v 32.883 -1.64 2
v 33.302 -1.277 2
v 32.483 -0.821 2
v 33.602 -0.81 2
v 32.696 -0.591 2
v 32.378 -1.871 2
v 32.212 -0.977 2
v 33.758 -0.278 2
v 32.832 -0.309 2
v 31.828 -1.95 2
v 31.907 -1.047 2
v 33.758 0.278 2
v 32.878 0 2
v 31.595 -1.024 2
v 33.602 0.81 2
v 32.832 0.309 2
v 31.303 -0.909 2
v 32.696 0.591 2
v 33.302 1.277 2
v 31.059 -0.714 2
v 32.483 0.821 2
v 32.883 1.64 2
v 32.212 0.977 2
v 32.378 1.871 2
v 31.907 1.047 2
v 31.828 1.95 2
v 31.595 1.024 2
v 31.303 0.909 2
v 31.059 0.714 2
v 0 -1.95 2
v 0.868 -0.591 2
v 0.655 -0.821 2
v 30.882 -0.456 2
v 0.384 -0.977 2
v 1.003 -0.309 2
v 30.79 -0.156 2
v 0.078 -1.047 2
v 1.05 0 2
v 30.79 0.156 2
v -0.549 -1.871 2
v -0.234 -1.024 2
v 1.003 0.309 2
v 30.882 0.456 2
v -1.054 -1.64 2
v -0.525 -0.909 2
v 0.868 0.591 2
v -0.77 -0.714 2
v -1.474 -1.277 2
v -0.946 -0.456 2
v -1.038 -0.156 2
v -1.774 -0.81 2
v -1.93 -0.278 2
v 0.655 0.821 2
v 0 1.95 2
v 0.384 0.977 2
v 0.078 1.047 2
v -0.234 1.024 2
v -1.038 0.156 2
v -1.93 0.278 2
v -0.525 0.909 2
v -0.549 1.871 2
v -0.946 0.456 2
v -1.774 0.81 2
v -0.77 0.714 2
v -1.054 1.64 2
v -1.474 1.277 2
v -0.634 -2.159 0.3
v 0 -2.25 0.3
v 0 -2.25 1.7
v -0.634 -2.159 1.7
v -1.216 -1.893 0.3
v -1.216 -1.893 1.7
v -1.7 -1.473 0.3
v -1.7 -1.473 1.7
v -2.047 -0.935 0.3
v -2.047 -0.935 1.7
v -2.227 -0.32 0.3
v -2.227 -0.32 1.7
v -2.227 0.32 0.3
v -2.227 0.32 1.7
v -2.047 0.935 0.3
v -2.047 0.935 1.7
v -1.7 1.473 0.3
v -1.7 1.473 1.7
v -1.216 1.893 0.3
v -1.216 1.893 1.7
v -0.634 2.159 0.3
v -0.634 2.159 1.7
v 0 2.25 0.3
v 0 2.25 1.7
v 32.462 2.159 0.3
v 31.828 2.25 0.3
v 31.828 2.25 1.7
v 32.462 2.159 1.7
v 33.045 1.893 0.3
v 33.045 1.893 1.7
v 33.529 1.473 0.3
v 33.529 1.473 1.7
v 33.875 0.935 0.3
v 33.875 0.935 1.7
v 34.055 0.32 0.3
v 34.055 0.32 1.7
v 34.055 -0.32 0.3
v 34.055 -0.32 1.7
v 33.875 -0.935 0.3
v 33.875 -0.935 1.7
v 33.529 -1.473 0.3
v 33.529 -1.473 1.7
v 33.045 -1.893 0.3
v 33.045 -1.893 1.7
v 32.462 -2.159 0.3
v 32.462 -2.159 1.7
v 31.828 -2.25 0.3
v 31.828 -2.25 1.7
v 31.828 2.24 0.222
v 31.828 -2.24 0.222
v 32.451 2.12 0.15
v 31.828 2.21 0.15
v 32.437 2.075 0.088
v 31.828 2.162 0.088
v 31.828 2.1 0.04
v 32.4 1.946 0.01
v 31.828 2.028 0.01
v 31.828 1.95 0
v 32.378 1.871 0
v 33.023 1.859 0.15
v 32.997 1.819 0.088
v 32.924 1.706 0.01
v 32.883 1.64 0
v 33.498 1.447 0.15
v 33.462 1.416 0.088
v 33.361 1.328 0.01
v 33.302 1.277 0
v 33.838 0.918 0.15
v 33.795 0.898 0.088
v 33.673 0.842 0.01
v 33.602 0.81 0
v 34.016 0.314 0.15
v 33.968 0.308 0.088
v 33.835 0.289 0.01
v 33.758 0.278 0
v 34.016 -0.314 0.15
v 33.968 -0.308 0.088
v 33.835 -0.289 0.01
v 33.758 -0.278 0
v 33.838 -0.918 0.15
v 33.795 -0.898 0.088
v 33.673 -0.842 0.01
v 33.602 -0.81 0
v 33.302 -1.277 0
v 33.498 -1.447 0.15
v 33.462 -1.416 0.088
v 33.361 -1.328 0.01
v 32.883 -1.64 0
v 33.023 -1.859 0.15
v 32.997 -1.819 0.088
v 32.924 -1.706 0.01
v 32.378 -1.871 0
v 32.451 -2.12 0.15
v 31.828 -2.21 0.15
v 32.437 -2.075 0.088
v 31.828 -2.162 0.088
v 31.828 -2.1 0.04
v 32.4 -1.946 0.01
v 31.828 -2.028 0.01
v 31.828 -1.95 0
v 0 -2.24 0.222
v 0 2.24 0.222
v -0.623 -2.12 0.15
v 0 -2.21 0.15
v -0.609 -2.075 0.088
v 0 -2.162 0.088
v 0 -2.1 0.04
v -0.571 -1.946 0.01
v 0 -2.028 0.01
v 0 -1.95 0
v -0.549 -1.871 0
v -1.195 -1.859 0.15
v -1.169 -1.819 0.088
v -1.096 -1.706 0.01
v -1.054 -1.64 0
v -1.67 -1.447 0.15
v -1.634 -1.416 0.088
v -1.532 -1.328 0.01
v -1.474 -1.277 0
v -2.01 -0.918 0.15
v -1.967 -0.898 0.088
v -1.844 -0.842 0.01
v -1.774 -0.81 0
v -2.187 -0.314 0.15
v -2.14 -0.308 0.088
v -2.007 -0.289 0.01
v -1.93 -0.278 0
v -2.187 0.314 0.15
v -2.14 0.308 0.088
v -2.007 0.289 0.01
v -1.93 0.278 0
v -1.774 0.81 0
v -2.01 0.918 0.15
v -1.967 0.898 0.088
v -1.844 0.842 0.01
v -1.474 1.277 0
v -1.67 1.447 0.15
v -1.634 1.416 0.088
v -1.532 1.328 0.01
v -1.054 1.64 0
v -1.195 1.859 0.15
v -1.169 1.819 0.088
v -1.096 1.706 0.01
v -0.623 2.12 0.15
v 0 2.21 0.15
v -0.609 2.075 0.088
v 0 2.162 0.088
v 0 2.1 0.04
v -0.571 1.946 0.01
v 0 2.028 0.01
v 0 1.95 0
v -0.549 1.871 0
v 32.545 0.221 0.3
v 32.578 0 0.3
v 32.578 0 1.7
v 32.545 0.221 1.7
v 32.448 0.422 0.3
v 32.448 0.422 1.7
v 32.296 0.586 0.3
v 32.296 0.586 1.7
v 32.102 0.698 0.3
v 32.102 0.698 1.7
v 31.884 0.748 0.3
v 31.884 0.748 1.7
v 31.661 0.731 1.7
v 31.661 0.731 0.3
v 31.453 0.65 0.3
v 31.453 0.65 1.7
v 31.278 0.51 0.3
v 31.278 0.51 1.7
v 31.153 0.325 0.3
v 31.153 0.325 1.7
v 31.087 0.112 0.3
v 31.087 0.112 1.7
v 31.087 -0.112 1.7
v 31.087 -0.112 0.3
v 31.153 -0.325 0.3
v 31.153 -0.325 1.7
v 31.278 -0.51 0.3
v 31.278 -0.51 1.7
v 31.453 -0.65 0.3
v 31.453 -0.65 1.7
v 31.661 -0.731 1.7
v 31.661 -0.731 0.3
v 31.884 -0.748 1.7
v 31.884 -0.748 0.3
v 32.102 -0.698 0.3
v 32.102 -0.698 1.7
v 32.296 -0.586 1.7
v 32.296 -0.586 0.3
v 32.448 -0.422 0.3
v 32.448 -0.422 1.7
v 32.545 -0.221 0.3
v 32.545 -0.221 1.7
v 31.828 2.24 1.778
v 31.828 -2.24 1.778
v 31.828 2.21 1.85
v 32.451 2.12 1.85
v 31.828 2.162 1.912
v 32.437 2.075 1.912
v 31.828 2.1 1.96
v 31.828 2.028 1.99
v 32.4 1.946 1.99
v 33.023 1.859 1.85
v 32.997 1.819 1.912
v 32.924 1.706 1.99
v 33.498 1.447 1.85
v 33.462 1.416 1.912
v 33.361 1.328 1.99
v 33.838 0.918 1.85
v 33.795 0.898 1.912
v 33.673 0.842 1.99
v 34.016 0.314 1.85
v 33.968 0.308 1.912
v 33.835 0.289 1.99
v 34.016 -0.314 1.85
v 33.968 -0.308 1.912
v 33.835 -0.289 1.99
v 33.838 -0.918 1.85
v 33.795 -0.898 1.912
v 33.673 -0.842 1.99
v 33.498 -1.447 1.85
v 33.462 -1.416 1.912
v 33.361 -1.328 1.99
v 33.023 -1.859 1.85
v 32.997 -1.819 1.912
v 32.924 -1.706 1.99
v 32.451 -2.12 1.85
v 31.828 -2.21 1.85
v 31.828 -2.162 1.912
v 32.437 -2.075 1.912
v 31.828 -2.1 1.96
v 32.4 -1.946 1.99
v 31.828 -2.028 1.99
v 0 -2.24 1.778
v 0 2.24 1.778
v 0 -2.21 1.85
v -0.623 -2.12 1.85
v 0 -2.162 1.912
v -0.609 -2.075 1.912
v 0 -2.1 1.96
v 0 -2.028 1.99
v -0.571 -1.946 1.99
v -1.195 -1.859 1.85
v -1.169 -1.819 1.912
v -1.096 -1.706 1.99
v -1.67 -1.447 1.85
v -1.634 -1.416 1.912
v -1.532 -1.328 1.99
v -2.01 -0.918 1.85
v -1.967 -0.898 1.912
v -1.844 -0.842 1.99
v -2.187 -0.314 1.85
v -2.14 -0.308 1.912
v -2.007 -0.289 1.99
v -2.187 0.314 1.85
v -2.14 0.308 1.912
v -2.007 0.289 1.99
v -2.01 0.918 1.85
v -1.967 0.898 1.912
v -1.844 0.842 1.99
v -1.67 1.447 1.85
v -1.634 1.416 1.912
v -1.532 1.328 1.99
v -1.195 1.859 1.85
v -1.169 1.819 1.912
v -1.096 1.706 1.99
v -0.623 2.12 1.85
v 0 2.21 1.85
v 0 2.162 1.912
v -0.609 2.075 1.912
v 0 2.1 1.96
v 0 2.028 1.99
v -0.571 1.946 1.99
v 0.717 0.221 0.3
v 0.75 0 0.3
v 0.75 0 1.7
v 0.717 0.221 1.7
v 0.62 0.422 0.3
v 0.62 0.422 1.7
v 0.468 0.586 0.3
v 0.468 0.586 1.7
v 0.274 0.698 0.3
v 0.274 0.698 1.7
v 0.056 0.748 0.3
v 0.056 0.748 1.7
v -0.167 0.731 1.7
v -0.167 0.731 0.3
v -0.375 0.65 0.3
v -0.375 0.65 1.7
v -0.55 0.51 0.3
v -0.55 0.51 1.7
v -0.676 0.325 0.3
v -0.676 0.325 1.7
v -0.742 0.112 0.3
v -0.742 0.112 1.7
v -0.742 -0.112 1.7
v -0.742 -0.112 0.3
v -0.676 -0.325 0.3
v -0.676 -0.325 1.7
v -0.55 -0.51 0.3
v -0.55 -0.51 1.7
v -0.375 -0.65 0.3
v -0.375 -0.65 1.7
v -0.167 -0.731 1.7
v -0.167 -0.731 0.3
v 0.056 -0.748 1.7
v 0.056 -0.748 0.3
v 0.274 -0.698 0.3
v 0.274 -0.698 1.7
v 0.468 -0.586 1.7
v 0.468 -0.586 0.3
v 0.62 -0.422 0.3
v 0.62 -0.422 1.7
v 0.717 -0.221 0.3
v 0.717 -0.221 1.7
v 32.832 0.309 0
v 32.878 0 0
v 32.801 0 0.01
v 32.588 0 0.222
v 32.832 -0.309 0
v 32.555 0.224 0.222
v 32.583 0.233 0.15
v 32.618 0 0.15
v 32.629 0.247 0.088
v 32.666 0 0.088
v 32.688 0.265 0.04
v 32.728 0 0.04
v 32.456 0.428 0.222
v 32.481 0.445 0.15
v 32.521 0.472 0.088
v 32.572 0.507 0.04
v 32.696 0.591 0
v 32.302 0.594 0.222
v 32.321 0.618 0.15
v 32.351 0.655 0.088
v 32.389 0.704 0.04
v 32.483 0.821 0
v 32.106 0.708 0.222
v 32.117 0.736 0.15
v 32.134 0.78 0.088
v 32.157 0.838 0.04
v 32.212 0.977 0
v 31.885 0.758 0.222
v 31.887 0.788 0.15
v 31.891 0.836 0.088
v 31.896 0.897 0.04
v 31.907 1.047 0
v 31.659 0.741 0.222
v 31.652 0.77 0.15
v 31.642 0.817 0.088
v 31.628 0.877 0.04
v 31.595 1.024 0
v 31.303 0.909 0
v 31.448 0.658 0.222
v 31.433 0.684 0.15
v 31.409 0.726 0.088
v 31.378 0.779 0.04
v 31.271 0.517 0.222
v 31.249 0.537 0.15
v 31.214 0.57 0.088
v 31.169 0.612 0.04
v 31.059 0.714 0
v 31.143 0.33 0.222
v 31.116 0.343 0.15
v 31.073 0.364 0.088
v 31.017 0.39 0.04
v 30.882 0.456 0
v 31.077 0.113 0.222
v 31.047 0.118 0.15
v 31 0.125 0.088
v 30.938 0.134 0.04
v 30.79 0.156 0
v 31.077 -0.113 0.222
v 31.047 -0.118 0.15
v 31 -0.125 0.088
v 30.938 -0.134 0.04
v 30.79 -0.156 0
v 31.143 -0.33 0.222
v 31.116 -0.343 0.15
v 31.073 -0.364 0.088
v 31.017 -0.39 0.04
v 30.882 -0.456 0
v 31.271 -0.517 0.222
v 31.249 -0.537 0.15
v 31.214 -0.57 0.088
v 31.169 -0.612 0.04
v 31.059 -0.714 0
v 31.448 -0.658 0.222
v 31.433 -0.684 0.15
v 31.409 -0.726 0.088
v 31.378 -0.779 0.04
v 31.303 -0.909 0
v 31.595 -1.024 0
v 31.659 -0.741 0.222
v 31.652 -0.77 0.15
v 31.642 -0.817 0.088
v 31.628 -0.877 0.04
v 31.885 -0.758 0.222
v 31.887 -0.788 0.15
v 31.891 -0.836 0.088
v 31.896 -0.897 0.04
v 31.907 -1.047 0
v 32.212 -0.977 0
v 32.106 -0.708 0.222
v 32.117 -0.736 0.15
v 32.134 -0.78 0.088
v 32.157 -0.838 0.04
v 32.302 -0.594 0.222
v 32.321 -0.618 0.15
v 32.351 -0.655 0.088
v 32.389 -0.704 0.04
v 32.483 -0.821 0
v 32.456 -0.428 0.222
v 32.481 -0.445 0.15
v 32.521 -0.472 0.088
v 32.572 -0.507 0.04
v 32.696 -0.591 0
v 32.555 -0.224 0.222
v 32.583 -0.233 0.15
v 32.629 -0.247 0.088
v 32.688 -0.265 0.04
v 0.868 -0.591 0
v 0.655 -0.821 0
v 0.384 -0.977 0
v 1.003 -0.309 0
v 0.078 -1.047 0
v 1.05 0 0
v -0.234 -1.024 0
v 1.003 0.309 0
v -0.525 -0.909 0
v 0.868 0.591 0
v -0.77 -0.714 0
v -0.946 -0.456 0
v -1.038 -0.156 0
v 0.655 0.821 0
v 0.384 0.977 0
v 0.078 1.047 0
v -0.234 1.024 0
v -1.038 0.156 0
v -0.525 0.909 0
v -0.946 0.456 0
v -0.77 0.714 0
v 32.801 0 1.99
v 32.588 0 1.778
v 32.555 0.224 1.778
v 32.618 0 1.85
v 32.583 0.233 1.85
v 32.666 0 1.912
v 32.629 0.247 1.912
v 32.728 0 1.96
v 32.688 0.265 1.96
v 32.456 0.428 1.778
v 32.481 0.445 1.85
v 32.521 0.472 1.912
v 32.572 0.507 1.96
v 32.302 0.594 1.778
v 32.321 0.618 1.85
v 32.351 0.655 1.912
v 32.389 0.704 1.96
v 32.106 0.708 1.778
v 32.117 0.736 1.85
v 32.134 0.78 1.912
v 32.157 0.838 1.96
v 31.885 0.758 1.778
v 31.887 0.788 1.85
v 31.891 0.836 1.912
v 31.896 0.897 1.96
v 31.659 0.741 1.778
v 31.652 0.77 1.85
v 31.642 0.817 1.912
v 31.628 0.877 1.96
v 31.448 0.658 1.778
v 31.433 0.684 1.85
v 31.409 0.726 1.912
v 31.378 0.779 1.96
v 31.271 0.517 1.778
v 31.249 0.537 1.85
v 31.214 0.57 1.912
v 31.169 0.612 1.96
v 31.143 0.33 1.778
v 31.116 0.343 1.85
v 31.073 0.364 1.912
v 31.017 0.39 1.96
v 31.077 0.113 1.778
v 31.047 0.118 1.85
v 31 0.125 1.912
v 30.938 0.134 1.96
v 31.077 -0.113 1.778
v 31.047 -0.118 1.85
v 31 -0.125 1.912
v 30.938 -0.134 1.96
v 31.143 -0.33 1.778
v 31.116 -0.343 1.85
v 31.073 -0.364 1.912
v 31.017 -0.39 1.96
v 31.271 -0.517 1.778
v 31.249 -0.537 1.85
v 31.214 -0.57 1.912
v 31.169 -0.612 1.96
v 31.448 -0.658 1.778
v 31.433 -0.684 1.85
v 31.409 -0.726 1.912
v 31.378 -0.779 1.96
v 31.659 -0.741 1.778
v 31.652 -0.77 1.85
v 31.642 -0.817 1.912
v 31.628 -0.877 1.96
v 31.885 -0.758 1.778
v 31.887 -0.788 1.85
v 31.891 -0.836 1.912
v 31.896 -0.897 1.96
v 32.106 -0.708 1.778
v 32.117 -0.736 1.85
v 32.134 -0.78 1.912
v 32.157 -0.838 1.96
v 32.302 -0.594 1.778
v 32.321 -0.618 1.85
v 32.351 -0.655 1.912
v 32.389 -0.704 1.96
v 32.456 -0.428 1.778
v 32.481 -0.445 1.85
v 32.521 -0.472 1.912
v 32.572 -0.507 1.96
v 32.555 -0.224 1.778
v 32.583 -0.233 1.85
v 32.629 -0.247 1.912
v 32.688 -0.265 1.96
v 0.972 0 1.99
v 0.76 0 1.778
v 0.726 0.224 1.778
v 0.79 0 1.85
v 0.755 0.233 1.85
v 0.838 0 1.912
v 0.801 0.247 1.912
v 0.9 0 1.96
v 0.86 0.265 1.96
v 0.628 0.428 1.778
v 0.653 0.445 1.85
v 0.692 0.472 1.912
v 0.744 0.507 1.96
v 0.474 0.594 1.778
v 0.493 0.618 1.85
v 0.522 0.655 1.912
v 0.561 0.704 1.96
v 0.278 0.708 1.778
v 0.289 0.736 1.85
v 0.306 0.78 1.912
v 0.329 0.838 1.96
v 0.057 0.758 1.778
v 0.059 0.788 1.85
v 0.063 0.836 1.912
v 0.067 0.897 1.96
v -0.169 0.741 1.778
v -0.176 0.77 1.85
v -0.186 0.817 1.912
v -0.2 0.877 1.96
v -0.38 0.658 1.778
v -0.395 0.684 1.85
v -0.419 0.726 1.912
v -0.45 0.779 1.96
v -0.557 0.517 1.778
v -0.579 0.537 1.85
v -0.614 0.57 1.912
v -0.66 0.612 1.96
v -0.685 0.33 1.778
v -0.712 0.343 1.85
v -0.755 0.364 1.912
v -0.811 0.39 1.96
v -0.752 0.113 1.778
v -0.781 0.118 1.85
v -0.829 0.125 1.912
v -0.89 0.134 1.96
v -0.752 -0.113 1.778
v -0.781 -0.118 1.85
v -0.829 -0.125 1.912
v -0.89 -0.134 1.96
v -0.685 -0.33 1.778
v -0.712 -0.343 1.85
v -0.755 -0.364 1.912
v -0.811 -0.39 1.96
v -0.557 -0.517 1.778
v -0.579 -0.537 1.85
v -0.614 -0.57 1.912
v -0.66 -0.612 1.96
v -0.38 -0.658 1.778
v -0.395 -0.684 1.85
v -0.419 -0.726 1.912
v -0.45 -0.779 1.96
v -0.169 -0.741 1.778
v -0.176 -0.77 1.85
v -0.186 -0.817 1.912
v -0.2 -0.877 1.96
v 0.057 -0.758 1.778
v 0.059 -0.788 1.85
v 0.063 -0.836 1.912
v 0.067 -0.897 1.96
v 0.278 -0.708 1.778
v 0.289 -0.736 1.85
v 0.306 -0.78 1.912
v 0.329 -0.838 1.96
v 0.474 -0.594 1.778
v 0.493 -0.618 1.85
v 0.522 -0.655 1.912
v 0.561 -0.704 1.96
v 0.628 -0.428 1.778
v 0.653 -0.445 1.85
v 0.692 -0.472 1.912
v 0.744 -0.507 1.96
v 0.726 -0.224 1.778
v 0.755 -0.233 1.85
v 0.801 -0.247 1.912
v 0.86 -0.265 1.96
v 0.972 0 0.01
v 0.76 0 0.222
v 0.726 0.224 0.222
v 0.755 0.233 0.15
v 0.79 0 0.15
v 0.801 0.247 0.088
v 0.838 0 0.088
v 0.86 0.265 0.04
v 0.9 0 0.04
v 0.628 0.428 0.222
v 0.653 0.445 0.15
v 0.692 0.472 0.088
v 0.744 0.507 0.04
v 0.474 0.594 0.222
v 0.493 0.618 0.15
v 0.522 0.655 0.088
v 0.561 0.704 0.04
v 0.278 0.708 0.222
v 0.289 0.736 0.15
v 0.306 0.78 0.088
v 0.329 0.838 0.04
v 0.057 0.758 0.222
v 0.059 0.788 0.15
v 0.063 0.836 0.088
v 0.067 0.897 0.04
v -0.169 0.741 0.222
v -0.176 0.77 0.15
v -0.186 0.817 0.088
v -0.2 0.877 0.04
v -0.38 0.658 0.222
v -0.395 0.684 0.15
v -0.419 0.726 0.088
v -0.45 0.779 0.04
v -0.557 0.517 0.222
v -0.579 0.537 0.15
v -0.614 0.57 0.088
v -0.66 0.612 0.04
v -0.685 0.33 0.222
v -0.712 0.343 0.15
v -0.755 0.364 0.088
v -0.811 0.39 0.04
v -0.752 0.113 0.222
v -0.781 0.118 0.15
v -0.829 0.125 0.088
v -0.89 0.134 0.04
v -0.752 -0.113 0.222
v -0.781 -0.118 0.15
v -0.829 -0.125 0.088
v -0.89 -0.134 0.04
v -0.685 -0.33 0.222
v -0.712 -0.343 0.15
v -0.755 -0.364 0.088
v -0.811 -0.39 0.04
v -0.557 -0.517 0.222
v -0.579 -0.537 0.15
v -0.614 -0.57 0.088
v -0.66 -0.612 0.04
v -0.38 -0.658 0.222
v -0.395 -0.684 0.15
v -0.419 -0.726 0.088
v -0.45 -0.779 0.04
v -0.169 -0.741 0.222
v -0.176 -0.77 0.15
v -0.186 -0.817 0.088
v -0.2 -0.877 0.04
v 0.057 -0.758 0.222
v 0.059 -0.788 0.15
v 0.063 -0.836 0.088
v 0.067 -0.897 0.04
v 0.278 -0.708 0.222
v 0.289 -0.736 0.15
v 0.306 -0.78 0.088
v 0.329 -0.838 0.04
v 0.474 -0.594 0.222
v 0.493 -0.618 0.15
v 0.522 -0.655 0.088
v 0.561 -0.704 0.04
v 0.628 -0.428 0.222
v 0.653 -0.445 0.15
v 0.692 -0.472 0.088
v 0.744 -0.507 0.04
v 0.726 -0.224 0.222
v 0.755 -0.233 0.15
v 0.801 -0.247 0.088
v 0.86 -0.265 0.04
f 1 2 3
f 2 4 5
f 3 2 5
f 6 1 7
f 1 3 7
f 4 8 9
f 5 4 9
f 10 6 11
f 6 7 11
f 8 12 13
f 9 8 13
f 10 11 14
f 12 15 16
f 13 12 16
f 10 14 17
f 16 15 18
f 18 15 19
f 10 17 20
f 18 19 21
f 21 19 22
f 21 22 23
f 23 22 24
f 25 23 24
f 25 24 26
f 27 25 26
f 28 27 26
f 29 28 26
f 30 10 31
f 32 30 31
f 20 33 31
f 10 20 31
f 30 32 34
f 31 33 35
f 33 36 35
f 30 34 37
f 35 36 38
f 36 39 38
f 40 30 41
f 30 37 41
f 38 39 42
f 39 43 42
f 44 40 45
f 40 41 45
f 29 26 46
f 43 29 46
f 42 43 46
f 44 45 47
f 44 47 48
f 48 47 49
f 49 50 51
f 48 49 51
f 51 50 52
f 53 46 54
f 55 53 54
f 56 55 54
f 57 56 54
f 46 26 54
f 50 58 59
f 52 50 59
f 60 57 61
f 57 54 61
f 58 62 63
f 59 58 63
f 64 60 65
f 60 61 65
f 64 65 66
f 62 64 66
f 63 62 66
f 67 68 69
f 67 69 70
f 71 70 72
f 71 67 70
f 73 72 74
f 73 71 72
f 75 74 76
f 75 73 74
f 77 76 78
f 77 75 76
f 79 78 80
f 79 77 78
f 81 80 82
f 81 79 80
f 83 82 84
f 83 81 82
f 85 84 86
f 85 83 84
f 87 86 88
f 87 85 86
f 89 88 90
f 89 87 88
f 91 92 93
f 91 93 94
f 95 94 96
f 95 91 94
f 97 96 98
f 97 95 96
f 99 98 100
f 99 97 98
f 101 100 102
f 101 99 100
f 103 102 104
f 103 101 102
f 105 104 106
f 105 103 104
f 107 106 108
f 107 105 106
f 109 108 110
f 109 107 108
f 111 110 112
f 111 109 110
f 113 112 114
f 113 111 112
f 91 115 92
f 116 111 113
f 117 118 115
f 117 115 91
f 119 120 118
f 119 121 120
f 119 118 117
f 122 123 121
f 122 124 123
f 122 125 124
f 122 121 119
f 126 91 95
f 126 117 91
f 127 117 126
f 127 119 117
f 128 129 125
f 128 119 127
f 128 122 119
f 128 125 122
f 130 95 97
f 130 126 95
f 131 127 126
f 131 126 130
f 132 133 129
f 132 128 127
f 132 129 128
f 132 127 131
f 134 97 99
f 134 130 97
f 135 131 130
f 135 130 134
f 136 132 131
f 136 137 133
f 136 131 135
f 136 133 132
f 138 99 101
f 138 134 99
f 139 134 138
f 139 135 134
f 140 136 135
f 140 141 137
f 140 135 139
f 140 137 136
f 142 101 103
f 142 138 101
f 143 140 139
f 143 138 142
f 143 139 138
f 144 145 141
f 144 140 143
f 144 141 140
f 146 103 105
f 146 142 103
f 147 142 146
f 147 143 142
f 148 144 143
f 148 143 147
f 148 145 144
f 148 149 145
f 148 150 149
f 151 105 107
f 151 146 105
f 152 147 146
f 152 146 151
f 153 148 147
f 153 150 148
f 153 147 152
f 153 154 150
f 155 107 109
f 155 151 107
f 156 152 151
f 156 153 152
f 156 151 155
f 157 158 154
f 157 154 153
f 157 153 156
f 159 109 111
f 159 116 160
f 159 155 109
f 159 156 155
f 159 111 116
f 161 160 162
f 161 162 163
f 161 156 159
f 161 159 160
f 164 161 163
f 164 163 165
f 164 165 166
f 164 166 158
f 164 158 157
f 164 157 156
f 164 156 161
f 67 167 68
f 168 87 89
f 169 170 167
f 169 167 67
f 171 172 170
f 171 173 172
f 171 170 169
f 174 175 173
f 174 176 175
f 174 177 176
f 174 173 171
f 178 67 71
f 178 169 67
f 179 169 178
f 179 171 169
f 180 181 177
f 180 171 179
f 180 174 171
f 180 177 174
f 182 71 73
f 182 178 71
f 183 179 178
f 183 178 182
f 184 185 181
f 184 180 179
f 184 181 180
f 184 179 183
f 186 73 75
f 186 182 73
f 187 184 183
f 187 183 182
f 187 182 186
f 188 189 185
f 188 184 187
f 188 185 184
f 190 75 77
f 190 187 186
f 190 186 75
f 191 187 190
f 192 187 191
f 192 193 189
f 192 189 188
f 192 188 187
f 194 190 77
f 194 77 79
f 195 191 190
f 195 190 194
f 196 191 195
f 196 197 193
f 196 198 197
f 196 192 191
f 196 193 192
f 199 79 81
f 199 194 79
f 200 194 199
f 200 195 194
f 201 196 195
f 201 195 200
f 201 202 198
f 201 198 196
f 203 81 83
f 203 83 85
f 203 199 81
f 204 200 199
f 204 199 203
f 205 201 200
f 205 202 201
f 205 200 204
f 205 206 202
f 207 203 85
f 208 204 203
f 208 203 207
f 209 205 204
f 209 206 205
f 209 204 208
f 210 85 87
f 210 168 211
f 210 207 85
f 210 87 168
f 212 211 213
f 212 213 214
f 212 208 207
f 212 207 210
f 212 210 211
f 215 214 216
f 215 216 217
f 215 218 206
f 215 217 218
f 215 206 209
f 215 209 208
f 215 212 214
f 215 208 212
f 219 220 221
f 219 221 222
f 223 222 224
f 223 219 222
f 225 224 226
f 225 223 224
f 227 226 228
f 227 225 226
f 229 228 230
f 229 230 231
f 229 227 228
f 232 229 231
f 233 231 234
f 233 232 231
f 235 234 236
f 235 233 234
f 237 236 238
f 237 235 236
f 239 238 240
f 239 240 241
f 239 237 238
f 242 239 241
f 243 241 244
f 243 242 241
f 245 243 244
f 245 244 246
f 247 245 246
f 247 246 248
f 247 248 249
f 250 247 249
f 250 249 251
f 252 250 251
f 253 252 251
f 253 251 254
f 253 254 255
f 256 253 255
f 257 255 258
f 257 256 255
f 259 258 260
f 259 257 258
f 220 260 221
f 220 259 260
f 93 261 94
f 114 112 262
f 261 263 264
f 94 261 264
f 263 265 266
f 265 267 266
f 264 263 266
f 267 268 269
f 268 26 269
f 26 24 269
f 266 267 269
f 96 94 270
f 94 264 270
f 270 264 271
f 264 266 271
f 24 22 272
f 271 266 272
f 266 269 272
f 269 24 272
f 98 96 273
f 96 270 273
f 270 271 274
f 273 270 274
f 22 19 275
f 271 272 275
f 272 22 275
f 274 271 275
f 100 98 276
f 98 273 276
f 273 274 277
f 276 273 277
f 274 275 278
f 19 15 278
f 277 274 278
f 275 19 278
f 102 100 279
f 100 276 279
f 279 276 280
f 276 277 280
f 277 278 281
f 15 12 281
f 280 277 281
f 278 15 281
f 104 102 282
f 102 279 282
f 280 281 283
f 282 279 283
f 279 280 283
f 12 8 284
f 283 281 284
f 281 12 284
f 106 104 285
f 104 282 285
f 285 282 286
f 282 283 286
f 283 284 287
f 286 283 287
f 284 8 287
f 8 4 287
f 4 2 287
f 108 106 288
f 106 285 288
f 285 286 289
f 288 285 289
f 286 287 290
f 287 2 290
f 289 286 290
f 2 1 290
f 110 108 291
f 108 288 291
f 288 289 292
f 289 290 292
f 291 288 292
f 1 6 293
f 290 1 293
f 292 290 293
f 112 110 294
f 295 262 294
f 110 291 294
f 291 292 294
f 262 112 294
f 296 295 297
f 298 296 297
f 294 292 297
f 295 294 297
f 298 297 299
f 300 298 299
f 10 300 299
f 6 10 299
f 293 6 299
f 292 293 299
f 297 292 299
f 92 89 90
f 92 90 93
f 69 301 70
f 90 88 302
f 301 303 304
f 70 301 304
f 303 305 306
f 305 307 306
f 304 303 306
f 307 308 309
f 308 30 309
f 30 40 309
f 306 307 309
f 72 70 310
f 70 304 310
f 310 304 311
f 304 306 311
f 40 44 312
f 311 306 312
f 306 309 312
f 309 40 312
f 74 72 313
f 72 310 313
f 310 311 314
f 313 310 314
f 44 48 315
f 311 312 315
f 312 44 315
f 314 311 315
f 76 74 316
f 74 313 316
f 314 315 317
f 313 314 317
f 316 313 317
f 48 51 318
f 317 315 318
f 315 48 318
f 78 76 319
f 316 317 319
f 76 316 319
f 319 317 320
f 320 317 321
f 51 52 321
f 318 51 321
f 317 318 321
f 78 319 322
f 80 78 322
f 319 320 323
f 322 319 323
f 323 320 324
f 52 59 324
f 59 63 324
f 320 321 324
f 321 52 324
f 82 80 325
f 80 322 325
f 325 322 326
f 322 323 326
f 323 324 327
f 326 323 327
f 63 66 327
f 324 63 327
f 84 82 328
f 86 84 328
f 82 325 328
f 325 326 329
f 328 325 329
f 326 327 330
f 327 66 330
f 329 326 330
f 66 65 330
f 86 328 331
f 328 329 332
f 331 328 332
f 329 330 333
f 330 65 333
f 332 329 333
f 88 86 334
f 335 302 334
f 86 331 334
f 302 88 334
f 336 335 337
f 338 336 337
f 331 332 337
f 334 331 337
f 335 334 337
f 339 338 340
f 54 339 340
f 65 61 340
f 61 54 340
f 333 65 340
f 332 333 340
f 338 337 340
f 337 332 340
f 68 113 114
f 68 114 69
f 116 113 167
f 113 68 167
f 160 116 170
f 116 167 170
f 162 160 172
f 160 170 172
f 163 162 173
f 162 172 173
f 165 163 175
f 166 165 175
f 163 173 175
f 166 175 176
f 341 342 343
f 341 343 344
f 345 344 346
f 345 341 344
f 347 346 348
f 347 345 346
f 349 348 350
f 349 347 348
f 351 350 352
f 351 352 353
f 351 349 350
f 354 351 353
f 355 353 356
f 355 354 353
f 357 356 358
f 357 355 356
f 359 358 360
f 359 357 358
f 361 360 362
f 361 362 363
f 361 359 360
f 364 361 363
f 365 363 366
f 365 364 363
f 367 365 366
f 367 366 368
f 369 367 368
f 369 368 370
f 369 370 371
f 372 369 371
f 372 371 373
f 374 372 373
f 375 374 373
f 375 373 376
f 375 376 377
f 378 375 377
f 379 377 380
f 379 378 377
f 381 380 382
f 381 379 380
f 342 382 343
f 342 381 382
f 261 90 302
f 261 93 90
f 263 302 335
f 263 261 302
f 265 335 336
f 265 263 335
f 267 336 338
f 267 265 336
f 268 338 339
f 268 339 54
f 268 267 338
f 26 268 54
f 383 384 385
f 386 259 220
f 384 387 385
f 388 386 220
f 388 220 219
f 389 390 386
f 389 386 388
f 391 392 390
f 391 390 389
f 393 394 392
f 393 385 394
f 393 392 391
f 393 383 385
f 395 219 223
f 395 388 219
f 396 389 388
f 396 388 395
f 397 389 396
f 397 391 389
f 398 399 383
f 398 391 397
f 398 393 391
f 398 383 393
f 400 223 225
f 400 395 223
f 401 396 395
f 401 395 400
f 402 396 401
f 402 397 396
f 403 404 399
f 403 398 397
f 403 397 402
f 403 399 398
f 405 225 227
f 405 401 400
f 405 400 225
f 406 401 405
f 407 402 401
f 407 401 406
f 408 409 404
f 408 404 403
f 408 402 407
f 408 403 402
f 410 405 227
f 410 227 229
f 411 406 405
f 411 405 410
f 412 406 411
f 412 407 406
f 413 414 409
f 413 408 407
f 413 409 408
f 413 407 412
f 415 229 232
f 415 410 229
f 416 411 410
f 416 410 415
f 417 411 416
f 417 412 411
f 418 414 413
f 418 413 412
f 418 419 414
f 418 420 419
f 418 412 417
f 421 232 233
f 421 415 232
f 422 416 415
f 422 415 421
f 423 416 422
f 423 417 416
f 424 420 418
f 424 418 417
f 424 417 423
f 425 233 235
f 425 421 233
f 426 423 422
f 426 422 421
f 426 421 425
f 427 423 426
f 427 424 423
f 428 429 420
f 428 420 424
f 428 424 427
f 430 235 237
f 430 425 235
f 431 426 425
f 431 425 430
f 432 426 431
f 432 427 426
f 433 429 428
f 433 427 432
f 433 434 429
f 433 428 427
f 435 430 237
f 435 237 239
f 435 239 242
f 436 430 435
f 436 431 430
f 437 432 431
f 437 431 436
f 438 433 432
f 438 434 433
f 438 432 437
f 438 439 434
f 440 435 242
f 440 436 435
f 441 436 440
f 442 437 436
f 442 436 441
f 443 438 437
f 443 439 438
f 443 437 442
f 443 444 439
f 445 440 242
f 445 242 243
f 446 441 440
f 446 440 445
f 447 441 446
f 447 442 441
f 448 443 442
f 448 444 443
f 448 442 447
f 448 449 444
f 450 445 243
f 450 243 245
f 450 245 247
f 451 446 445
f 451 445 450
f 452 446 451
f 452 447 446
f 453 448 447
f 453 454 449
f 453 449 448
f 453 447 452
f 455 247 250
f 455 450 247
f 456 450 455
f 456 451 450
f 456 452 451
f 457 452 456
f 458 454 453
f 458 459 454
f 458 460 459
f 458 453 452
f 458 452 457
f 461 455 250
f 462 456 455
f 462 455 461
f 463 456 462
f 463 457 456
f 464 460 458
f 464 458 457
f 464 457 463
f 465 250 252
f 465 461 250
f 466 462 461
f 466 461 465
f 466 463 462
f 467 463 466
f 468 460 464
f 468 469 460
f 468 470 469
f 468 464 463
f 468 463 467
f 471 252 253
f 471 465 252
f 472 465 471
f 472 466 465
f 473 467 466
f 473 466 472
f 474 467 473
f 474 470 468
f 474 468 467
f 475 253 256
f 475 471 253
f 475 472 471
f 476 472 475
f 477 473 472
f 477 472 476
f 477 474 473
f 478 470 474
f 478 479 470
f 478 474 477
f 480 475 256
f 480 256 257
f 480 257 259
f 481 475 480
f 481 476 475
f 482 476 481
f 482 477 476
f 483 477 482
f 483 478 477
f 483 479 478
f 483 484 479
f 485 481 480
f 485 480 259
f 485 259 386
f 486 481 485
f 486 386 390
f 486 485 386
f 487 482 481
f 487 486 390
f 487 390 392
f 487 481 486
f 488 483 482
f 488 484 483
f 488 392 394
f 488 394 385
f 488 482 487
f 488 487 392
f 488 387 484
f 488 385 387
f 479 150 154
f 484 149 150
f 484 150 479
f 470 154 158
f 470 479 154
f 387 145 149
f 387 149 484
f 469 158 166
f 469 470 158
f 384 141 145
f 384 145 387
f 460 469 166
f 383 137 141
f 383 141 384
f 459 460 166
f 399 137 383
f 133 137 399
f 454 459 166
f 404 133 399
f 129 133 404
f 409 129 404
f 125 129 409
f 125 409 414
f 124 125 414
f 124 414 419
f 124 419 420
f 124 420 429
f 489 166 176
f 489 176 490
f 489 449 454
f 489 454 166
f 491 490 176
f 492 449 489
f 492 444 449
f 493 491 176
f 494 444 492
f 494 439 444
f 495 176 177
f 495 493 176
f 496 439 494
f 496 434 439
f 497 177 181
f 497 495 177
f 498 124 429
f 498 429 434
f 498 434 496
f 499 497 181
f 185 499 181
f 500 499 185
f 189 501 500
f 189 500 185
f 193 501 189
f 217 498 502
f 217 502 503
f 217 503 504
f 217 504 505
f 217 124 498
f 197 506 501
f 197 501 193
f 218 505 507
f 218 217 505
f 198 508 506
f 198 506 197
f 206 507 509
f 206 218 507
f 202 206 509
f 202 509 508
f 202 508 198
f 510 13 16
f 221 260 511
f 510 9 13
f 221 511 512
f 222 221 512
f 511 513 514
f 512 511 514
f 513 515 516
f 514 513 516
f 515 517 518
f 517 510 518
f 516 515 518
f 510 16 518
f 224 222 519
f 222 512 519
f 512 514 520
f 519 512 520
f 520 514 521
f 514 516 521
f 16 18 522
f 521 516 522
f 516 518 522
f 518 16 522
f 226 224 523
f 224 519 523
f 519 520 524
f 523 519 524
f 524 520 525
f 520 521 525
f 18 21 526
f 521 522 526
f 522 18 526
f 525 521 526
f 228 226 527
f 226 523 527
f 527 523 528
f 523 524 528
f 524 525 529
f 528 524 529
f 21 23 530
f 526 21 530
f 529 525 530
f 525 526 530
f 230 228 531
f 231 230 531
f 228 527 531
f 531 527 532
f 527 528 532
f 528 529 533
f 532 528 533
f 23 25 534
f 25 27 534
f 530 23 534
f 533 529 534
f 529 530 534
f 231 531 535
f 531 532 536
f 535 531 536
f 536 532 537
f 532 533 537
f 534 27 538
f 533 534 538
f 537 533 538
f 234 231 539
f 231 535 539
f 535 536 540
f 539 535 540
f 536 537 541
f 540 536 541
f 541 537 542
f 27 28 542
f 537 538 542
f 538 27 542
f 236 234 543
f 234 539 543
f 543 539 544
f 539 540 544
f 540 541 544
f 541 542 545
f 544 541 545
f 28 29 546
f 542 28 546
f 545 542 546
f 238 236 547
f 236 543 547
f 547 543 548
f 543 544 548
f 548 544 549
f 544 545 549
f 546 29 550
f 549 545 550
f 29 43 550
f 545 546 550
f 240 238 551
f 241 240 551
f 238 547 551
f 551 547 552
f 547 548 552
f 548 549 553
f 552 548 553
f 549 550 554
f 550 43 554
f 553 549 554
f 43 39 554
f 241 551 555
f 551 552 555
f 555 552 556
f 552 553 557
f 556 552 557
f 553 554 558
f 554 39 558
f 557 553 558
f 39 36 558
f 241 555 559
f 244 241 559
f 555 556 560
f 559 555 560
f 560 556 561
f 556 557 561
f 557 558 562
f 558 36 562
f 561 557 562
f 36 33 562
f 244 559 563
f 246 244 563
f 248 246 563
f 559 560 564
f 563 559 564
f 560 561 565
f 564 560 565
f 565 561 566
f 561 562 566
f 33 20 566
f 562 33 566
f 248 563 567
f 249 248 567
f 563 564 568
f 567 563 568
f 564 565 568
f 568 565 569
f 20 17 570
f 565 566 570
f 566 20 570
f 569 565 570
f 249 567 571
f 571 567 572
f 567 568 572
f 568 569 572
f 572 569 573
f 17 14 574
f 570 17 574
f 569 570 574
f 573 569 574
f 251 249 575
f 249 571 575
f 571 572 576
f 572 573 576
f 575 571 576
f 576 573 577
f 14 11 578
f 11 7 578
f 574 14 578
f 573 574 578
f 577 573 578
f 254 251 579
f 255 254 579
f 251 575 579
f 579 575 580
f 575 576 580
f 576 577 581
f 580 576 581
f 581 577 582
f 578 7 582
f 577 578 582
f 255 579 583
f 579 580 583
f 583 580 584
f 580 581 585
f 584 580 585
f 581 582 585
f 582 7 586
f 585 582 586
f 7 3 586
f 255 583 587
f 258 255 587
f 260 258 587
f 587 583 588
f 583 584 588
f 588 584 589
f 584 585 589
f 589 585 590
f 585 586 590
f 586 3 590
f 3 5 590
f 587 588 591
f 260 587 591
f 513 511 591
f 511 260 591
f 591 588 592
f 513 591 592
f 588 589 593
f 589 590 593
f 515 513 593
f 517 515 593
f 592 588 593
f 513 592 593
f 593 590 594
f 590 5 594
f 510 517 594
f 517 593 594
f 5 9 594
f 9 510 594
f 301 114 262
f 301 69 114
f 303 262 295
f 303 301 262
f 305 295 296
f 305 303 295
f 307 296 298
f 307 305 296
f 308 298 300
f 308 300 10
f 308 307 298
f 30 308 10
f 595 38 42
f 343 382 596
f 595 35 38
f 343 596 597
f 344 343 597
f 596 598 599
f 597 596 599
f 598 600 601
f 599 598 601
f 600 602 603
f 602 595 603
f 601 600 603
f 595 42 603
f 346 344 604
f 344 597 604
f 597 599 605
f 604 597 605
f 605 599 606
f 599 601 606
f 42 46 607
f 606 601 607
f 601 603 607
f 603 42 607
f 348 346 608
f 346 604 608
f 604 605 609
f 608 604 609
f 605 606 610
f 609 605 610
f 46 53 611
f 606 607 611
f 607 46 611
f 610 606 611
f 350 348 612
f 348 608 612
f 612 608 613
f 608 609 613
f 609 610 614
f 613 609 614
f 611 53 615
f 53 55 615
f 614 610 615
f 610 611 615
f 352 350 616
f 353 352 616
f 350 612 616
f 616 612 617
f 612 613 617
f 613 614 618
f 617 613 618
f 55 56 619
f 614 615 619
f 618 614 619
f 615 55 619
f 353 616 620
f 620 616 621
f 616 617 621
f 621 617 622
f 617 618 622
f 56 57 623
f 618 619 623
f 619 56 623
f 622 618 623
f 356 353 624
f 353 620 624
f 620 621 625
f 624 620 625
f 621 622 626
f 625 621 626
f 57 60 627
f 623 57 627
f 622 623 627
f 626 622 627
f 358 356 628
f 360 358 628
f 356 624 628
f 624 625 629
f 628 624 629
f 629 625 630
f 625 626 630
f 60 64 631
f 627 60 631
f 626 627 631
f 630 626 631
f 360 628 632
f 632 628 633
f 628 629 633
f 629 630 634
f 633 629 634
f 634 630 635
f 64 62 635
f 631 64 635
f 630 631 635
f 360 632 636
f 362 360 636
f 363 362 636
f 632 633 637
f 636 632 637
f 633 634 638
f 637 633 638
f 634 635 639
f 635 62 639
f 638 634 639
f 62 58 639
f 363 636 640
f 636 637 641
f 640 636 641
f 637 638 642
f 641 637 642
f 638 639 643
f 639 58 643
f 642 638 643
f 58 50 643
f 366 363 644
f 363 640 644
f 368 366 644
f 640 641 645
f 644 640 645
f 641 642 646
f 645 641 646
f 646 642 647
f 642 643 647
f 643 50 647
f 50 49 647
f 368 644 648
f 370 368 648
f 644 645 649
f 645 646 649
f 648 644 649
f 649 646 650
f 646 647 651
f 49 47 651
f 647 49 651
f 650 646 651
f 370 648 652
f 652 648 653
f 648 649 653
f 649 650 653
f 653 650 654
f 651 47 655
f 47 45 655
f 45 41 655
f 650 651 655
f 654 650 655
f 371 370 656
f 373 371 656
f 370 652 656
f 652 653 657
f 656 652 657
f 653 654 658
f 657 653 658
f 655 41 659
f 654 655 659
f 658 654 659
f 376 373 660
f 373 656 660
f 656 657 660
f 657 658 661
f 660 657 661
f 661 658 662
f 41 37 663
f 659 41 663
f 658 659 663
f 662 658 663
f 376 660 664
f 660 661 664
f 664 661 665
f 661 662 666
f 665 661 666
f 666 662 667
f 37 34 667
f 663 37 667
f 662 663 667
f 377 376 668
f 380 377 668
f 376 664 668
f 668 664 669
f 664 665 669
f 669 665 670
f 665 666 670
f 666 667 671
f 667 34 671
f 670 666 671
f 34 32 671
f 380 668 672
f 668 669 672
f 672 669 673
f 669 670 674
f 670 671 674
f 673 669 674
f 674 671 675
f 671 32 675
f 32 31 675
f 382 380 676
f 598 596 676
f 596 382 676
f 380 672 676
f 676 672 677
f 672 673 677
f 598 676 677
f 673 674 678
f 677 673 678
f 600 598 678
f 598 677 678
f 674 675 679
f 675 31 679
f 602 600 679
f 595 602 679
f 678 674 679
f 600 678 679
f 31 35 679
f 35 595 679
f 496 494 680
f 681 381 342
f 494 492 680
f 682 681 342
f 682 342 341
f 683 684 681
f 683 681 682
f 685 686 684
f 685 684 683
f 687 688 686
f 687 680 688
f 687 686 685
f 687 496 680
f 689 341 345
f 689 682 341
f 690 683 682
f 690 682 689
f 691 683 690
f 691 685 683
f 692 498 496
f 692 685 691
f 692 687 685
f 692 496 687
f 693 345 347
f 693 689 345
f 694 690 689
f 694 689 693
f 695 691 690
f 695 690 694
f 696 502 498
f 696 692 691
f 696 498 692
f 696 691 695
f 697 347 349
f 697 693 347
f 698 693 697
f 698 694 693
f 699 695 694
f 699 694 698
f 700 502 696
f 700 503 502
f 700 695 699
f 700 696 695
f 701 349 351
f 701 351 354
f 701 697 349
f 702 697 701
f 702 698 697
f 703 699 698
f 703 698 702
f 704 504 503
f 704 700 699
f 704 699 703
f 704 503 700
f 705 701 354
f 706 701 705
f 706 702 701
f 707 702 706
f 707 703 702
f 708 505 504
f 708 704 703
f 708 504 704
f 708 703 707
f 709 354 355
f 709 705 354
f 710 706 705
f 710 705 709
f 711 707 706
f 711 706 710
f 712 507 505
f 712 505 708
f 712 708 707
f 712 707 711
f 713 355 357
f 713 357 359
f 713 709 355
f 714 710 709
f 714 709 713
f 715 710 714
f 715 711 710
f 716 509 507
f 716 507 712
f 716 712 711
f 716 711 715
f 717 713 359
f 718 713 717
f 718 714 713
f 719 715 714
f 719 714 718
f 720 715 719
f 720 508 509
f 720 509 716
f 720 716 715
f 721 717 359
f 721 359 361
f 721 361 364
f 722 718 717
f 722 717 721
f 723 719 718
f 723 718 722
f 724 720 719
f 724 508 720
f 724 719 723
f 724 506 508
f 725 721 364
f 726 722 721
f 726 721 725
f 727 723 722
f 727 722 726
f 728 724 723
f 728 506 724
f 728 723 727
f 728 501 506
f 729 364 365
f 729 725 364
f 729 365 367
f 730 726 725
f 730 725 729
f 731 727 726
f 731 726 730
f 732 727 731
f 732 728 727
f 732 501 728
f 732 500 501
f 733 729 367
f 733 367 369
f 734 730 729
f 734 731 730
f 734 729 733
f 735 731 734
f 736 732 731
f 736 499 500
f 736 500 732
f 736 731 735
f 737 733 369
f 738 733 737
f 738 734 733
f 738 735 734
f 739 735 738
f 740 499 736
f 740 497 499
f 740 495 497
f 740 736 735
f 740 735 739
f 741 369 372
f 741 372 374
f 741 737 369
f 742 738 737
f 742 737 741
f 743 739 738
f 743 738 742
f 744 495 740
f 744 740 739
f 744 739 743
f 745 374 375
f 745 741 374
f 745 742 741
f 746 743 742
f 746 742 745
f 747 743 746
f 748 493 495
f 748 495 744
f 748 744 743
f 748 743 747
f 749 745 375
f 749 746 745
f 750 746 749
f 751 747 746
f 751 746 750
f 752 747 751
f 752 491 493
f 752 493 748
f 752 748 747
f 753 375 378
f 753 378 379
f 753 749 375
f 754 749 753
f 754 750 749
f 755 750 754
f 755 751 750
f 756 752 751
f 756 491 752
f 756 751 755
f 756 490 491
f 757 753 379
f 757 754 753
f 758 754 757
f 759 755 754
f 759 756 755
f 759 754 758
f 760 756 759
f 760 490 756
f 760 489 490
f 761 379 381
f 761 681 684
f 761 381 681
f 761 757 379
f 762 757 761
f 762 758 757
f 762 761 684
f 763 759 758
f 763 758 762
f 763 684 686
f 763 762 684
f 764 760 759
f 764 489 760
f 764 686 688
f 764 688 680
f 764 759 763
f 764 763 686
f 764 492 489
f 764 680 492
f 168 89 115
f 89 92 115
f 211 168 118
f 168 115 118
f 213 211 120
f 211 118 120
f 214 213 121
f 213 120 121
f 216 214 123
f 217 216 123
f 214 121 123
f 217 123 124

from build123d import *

# Parameters (mm, degrees)
SKETCH1_R           = 0.75
BOSS_EXTRUDE1_DEPTH = 2
FILLET1_R           = 0.3


with BuildPart() as part:
    # Sketch1 → Boss-Extrude1 (new body)
    with BuildSketch(Plane.XY):
        with BuildLine():
            Line((0, 2.25), (31.82825623, 2.25))
            ThreePointArc((31.82825623, 2.25), (34.07825623, 0), (31.82825623, -2.25))
            Line((31.82825623, -2.25), (0, -2.25))
            ThreePointArc((0, -2.25), (-2.25, 0), (0, 2.25))
        make_face()
        Circle(SKETCH1_R, mode=Mode.SUBTRACT)
        with Locations((31.82825623, 0)):
            Circle(SKETCH1_R, mode=Mode.SUBTRACT)
    extrude(amount=BOSS_EXTRUDE1_DEPTH)

    # Fillet1
    fillet1_edges = [part.edges().sort_by_distance(p)[0] for p in [
        (34.07825623, 0, 2),
        (-0.75, 0, 0),
        (-0.75, 0, 2),
        (15.914128115, 2.25, 2),
        (31.07825623, 0, 0),
        (31.07825623, 0, 2),
        (-2.25, 0, 2),
        (15.914128115, 2.25, 0),
        (34.07825623, 0, 0),
        (15.914128115, -2.25, 0),
        (-2.25, 0, 0),
        (15.914128115, -2.25, 2),
    ]]
    fillet(fillet1_edges, radius=FILLET1_R)


solid = part.part
